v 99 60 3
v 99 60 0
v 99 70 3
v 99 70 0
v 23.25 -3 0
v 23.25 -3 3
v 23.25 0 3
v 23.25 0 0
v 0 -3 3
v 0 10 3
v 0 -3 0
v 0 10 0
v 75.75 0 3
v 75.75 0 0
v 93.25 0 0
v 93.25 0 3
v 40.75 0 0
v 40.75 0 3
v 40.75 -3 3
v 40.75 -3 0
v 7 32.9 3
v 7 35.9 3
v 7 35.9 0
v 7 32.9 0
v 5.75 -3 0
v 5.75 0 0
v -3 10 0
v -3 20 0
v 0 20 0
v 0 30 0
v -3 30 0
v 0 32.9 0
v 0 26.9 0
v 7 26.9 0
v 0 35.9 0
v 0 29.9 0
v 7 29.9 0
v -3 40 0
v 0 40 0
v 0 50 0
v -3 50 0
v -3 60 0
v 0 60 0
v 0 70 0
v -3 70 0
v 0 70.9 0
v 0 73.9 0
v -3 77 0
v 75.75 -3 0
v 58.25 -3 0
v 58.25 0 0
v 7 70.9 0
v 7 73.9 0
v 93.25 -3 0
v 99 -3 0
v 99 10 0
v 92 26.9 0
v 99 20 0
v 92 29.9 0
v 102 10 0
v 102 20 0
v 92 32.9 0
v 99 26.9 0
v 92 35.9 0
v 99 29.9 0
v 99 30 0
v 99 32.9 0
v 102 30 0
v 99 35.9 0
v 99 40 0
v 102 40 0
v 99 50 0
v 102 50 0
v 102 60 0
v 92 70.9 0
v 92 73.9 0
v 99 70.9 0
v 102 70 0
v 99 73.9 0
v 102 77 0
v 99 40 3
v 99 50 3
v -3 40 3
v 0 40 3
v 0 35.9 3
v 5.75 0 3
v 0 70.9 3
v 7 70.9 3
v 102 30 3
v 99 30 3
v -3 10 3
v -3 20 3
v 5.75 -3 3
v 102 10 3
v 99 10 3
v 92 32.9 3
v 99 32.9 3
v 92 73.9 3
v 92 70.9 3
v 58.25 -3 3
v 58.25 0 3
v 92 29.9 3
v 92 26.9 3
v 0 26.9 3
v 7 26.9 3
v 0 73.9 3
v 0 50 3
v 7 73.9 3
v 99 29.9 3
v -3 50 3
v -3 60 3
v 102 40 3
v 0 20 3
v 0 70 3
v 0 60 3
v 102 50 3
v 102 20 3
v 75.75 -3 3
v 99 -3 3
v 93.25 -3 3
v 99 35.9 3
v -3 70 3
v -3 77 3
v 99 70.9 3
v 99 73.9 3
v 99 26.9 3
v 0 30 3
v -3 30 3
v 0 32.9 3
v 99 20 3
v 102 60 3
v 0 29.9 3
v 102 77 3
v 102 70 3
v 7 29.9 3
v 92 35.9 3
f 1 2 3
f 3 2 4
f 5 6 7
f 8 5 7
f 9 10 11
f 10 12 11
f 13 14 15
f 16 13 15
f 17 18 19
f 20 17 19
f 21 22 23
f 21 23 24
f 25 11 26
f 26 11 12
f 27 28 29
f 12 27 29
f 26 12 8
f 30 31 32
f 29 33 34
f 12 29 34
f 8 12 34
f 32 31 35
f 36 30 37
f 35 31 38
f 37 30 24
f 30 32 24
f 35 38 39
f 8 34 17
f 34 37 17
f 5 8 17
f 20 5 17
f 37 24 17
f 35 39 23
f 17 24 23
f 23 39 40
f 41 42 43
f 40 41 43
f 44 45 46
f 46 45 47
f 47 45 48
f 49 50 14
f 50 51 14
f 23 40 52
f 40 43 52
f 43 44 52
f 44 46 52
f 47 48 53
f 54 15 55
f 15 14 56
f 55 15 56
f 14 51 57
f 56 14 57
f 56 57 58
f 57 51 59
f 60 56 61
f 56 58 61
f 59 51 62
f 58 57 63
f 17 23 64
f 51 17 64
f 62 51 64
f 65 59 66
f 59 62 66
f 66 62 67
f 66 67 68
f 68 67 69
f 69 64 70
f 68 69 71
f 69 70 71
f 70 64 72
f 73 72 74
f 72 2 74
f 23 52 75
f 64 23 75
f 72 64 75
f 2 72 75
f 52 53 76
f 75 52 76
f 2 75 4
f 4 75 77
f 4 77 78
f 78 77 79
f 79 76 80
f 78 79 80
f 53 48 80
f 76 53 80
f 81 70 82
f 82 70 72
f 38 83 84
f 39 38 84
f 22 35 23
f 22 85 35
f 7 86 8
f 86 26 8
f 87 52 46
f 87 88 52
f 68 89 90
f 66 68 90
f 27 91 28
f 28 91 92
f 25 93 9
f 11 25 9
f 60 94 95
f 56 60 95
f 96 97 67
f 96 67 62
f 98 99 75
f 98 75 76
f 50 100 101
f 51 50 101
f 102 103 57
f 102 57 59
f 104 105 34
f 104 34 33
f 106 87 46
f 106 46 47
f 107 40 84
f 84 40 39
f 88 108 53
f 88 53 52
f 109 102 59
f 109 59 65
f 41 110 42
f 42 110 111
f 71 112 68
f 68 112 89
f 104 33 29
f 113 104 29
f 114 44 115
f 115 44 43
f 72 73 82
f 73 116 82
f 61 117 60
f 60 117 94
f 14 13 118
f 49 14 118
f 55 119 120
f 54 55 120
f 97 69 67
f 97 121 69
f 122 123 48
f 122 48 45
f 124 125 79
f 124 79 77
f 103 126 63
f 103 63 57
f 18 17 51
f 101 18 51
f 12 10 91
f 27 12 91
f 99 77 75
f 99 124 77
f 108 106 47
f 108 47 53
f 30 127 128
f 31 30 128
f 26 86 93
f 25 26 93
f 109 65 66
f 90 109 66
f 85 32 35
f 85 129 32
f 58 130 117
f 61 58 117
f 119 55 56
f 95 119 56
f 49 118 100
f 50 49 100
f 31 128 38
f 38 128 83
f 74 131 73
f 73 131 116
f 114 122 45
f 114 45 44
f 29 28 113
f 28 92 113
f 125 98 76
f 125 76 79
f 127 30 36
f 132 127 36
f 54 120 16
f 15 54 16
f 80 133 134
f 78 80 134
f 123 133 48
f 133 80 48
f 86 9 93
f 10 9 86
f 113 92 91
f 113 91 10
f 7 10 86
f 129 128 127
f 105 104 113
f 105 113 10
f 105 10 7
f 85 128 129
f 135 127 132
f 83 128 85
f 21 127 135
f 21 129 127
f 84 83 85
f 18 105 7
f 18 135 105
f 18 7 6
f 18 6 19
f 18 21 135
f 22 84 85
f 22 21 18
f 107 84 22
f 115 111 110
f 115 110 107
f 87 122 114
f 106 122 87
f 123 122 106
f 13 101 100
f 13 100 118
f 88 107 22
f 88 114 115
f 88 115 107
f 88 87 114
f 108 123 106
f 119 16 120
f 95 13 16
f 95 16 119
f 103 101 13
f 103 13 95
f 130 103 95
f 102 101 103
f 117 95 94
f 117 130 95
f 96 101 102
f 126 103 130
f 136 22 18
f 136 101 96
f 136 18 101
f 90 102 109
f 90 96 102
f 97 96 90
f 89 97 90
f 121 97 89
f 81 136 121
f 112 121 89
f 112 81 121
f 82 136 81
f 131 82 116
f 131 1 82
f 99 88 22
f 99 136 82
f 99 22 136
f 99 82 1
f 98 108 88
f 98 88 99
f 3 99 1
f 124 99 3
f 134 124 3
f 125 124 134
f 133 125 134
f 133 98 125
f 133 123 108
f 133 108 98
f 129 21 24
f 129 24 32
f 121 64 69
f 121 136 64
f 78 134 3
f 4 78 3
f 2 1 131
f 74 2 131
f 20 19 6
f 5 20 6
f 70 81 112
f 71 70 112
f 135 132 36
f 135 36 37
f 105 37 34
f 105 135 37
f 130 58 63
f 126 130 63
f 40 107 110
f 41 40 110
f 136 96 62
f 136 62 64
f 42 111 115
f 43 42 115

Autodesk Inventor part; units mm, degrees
ref_plane "YZ Plane" through (0, 0, 0) normal (1, 0, 0) x (0, 1, 0)
ref_plane "XZ Plane" through (0, 0, 0) normal (0, 1, 0) x (-1, 0, 0)
ref_plane "XY Plane" through (0, 0, 0) normal (0, 0, 1) x (1, 0, 0)
sketch "Sketch1" plane through (0, 0, 0) normal (0, 0, 1) x (1, 0, 0)
  line L0 (0, 0) -> (99, 0)
  line L1 (99, 0) -> (99, 77)
  line L2 (99, 77) -> (0, 77)
  line L3 (0, 77) -> (0, 0)
  dimension "d0" = 99
  dimension "d1" = 77
extrude "Extrusion1" add sketch "Sketch1" along normal blind 3
sketch "Sketch2" plane through (0, 0, 3) normal (0, 0, 1) x (1, 0, 0)
  line L0 (99, 77) -> (0, 77) projected
  line L1 (0, 0) -> (99, 0) projected
  line L2 (0, 77) -> (99, 77)
  line L3 (99, 77) -> (99, 0)
  line L4 (99, 0) -> (0, 0)
  line L5 (0, 0) -> (0, 77)
  line L6 (0, 77) -> (0, 0) projected
  line L7 (0, 10) -> (-3, 10)
  line L8 (-3, 10) -> (-3, 20)
  line L9 (-3, 20) -> (0, 20)
  line L10 (-3, 40) -> (0, 40)
  line L11 (-3, 30) -> (-3, 40)
  line L12 (0, 30) -> (-3, 30)
  line L13 (-3, 60) -> (0, 60)
  line L14 (-3, 50) -> (-3, 60)
  line L15 (0, 50) -> (-3, 50)
  line L16 (99, 77) -> (0, 77) projected
  line L17 (0, 77) -> (-3, 77)
  line L18 (-3, 77) -> (-3, 70)
  line L19 (-3, 70) -> (0, 70)
  line L20 (99, 0) -> (99, 77) projected
  line L21 (99, 77) -> (102, 77)
  line L22 (102, 77) -> (102, 70)
  line L23 (102, 70) -> (99, 70)
  line L24 (99, 0) -> (99, 77) projected
  line L25 (99, 60) -> (102, 60)
  line L26 (102, 60) -> (102, 50)
  line L27 (102, 50) -> (99, 50)
  line L28 (99, 40) -> (102, 40)
  line L29 (102, 40) -> (102, 30)
  line L30 (102, 30) -> (99, 30)
  line L31 (99, 20) -> (102, 20)
  line L32 (102, 20) -> (102, 10)
  line L33 (102, 10) -> (99, 10)
  line L34 (99, 10) -> (99, -3)
  line L35 (99, -3) -> (93.25, -3)
  line L36 (93.25, -3) -> (93.25, 0)
  line L37 (93.25, 0) -> (75.75, 0)
  line L38 (75.75, 0) -> (75.75, -3)
  line L39 (75.75, -3) -> (58.25, -3)
  line L40 (58.25, -3) -> (58.25, 0)
  line L41 (58.25, 0) -> (40.75, 0)
  line L42 (40.75, 0) -> (40.75, -3)
  line L43 (40.75, -3) -> (23.25, -3)
  line L44 (23.25, -3) -> (23.25, 0)
  line L45 (23.25, 0) -> (5.75, 0)
  line L46 (5.75, 0) -> (5.75, -3)
  line L47 (5.75, -3) -> (0, -3)
  line L48 (0, -3) -> (0, 0)
  point P0 (99, 30)
  point P1 (99, 20)
  point P2 (99, 10)
  point P3 (23.25, 0)
  point P4 (58.25, 0)
  point P5 (93.25, 0)
  dimension "d13" = 3
  dimension "d14" = 10
  dimension "d17" = 20
  dimension "d22" = 3
  dimension "d23" = 7
  dimension "d24" = 3
  dimension "d48" = 13
  dimension "d49" = 5.75
  dimension "d50" = 17.5
  dimension "d51" = 17.5
  dimension "d52" = 17.5
  dimension "d53" = 17.5
  dimension "d54" = 17.5
  dimension "d55" = 5.75
extrude "Extrusion2" add sketch "Sketch2" against normal blind 3 contours L21 L22 L23 L3 | L5 L19 L18 L17 | L25 L26 L27 L3 | L5 L15 L14 L13 | L28 L29 L30 L3 | L5 L12 L11 L10 | L31 L32 L33 L3 | L5 L7 L8 L9 | L34 L35 L36 L1 | L1 L46 L47 L48 | L38 L39 L40 L1 | L1 L42 L43 L44
sketch "Sketch3" plane through (0, 0, 3) normal (0, 0, 1) x (1, 0, 0)
  line L0 (0, 73.9) -> (7, 73.9)
  line L1 (7, 73.9) -> (7, 70.9)
  line L2 (7, 70.9) -> (0, 70.9)
  line L3 (0, 70.9) -> (0, 73.9)
  line L4 (92, 73.9) -> (99, 73.9)
  line L5 (99, 73.9) -> (99, 70.9)
  line L6 (99, 70.9) -> (92, 70.9)
  line L7 (92, 70.9) -> (92, 73.9)
  line L8 (0, 35.9) -> (7, 35.9)
  line L9 (7, 35.9) -> (7, 32.9)
  line L10 (7, 32.9) -> (0, 32.9)
  line L11 (0, 32.9) -> (0, 35.9)
  line L12 (92, 35.9) -> (99, 35.9)
  line L13 (99, 35.9) -> (99, 32.9)
  line L14 (99, 32.9) -> (92, 32.9)
  line L15 (92, 32.9) -> (92, 35.9)
  line L16 (7, 29.9) -> (7, 26.9)
  line L17 (7, 26.9) -> (0, 26.9)
  line L18 (0, 26.9) -> (0, 29.9)
  line L19 (0, 29.9) -> (7, 29.9)
  line L20 (99, 35.9) -> (99, 32.9)
  line L21 (99, 32.9) -> (92, 32.9)
  line L22 (92, 32.9) -> (92, 35.9)
  line L23 (92, 35.9) -> (99, 35.9)
  line L24 (99, 29.9) -> (99, 26.9)
  line L25 (99, 26.9) -> (92, 26.9)
  line L26 (92, 26.9) -> (92, 29.9)
  line L27 (92, 29.9) -> (99, 29.9)
  line L28 (-3, 77) -> (102, 77) projected
  line L29 (99, 20) -> (99, 30) projected
  point P0 (0, 0)
  dimension "d27" = 7
  dimension "d28" = 3
  dimension "d31" = 92
  dimension "d34" = 38
  dimension "d41" = 6
  dimension "d44" = 92
  dimension "d47" = 3.1
extrude "Extrusion3" cut sketch "Sketch3" against normal through all
properties part number "DoosjeVoorkant" material "Wood (Cherry)"
